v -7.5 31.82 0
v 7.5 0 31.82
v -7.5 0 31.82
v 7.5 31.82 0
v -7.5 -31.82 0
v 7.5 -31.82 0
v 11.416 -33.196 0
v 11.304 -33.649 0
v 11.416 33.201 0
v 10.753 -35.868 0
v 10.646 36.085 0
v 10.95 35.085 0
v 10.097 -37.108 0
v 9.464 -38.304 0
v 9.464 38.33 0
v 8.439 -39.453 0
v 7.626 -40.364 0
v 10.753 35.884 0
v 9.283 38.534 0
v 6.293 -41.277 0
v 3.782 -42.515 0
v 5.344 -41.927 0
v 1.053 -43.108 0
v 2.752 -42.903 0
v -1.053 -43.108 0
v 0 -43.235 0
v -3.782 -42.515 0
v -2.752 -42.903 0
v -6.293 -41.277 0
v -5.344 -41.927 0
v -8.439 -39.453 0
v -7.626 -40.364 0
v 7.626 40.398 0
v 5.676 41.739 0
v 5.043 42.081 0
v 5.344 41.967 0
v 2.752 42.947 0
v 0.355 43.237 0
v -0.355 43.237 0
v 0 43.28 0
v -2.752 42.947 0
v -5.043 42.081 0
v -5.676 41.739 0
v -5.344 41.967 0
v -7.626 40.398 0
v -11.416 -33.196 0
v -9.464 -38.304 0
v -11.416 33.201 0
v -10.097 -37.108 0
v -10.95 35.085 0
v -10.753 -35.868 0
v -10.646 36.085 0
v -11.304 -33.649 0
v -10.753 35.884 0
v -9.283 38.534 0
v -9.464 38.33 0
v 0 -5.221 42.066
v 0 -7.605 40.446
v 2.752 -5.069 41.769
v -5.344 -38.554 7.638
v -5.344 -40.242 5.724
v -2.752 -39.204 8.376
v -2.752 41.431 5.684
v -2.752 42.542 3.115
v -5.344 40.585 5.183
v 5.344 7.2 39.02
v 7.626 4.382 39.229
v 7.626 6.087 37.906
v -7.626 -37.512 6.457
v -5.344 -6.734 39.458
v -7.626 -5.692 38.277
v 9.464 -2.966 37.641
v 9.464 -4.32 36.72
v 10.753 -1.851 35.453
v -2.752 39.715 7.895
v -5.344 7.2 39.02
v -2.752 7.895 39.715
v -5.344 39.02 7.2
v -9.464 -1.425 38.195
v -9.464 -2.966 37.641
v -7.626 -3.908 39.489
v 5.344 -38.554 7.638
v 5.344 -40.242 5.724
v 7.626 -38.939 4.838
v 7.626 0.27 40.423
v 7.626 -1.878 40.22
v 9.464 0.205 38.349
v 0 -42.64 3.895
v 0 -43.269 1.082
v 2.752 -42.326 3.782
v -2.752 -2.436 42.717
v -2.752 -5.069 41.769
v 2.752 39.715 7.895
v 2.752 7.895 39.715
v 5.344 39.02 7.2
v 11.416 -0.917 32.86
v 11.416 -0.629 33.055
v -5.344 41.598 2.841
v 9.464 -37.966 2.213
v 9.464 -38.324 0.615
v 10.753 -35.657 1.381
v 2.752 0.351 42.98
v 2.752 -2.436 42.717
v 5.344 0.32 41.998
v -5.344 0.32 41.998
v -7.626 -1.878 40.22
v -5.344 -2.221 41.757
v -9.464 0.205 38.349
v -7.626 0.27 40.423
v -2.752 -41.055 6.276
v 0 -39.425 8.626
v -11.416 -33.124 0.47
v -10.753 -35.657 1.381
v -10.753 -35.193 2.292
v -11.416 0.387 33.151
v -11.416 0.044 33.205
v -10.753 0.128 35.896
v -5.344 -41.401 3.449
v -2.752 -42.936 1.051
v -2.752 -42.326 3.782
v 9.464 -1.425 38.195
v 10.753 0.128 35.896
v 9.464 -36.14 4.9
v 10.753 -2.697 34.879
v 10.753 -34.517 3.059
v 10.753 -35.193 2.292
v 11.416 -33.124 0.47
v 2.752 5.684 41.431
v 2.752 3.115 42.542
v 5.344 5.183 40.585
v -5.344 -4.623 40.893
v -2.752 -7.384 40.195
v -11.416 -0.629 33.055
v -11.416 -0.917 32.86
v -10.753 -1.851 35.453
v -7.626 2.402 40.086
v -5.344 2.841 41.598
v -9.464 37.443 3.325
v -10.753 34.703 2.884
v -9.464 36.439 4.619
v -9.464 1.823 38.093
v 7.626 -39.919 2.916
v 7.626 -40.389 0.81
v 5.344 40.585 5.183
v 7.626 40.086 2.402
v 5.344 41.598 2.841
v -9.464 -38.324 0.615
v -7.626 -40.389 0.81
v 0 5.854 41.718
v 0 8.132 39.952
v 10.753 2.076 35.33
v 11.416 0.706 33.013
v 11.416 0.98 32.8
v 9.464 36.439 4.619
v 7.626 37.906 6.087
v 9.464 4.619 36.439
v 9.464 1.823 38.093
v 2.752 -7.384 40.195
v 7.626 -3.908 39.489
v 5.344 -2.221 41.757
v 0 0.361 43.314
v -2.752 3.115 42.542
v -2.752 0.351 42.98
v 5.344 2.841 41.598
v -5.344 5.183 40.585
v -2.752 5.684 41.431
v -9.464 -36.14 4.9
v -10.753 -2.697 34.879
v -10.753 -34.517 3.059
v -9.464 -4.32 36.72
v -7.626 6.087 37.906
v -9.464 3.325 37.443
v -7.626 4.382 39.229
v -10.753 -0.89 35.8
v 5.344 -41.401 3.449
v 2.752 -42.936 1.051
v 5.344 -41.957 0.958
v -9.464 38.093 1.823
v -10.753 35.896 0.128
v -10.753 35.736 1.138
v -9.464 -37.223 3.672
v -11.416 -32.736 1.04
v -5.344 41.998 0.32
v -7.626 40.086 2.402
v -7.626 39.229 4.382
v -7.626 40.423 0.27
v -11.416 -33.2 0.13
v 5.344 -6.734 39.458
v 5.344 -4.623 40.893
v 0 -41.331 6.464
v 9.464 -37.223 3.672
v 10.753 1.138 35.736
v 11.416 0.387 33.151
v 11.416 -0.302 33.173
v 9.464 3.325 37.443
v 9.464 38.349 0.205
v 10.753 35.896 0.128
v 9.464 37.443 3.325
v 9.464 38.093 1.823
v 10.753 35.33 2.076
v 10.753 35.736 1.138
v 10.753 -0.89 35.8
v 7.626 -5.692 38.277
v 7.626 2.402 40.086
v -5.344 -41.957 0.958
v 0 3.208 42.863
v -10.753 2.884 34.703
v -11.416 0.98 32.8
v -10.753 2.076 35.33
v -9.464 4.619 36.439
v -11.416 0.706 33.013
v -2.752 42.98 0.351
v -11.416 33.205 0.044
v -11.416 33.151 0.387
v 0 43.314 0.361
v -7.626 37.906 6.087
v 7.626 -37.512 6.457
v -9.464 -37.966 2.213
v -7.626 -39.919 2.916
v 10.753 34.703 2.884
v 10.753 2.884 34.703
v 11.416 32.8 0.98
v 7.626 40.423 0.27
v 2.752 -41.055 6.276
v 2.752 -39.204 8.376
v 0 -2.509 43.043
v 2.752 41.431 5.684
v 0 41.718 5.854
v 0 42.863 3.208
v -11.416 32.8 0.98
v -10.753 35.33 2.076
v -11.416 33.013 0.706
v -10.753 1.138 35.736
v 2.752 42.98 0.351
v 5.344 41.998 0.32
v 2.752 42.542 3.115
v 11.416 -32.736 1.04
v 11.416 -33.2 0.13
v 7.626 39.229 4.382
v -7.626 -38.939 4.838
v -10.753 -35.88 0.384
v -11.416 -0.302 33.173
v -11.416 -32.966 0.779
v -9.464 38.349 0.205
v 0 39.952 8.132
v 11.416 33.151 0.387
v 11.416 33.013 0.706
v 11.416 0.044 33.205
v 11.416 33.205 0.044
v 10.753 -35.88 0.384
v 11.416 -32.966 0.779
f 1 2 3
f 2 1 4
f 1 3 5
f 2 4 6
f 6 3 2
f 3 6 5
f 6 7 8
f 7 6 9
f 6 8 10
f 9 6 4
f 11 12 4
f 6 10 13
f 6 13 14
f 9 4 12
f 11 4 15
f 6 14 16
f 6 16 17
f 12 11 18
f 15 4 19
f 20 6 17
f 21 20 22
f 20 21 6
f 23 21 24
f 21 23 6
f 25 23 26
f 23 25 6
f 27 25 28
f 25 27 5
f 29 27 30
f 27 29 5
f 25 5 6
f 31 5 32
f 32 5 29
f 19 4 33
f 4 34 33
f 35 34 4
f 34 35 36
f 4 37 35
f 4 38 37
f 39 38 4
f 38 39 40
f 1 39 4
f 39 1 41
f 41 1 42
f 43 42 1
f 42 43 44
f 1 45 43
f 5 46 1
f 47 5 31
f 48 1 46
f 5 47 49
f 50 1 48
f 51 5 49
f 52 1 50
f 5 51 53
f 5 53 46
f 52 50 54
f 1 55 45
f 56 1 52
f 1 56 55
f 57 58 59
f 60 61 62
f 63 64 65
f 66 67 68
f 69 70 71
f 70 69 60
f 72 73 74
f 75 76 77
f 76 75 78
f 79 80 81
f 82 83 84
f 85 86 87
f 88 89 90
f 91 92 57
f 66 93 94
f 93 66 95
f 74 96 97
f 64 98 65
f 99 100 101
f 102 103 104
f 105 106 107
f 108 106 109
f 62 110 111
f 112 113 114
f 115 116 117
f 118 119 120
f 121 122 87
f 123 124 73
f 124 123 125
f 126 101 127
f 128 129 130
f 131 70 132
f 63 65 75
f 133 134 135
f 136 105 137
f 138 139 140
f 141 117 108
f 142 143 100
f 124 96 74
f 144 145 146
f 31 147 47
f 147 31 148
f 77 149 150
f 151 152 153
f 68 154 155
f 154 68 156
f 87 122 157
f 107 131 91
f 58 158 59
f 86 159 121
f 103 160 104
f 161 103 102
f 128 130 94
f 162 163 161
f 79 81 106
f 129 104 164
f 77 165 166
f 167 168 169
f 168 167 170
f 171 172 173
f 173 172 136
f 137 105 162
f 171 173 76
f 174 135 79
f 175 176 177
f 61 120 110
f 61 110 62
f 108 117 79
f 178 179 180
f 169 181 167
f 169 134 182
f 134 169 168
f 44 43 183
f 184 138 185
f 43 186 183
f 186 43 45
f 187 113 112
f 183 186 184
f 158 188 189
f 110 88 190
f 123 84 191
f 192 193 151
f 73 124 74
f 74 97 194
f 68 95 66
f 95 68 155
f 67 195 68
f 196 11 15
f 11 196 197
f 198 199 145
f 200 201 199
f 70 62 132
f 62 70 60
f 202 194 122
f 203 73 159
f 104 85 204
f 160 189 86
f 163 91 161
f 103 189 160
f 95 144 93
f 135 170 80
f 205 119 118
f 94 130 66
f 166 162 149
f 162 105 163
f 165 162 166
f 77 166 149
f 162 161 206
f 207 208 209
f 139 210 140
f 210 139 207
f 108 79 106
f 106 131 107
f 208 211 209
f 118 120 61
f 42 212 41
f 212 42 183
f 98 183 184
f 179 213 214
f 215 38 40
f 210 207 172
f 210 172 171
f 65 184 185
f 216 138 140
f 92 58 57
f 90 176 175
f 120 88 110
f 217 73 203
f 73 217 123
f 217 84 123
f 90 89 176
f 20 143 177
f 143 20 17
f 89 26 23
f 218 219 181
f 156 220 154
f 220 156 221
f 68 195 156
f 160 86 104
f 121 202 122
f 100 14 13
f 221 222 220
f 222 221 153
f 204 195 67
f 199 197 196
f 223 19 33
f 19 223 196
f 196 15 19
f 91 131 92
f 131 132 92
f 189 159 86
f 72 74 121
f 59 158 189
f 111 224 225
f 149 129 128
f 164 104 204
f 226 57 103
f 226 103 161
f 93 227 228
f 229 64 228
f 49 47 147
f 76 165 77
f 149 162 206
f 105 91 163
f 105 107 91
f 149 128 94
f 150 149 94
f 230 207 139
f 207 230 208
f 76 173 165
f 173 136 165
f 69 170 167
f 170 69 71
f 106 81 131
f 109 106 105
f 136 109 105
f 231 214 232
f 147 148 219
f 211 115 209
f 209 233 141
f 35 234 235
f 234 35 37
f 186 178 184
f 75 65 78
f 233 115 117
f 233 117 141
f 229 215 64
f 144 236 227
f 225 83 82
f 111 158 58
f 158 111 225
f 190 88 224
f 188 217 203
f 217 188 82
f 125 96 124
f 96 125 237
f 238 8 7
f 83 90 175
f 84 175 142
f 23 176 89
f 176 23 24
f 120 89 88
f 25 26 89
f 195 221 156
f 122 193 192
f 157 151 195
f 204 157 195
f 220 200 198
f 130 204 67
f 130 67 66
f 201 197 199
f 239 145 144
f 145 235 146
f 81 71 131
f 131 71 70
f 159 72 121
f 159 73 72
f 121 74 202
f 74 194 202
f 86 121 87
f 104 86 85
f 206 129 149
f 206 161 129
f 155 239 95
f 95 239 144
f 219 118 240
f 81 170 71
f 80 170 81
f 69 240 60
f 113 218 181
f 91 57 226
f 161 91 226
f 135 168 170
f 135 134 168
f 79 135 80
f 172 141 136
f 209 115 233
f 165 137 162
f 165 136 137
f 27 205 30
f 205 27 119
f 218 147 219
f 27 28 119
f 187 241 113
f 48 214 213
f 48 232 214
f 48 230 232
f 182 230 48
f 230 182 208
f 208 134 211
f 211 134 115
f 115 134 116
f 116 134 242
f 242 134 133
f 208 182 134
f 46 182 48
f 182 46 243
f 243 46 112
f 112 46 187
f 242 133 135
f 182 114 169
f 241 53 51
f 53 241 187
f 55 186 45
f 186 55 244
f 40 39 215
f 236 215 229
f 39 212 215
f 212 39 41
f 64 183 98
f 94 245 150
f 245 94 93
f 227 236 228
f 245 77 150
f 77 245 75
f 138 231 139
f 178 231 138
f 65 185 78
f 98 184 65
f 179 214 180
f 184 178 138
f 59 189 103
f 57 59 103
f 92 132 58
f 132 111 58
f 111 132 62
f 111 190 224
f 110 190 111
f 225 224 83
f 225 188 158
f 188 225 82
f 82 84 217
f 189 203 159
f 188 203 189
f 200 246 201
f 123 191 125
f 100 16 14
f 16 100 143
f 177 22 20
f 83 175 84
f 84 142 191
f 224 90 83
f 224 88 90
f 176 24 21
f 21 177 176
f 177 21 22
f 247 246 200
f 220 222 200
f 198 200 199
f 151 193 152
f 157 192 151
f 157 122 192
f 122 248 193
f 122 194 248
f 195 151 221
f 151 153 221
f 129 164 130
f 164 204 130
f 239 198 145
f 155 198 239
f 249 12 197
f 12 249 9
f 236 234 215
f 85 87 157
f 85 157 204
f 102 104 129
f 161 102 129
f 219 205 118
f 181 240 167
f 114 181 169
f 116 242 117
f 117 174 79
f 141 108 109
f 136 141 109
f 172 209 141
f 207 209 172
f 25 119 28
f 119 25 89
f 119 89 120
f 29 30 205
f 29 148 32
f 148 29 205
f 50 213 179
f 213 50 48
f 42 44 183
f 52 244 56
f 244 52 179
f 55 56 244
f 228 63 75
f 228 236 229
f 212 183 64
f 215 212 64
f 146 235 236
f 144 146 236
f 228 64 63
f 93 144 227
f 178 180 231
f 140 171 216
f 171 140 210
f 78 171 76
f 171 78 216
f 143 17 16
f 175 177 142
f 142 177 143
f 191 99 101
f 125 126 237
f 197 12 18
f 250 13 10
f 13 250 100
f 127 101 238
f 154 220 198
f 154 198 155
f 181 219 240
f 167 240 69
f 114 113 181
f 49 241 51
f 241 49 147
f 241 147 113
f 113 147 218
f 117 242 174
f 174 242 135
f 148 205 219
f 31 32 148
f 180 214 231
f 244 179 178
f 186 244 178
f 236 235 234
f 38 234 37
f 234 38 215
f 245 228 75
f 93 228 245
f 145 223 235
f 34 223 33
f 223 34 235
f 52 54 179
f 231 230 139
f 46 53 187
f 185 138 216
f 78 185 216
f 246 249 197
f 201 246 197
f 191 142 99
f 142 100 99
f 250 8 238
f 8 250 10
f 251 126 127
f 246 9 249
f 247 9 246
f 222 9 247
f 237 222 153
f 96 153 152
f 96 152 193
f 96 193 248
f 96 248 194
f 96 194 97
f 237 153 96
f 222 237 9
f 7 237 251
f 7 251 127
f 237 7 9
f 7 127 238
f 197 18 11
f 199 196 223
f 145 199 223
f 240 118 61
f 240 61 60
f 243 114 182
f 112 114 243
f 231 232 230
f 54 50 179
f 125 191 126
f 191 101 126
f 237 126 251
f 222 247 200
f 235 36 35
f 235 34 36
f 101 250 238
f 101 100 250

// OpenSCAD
// PROTECTIVE CORNER FOR TABLE
//////////////////////////////
//This part is meant to be placed on the corner of a table in order to avoid people from bumping into it and getting hurt
//Designed by David LE GALL on 13/04/2016 and published under the CC-BY-NC liscence
//////////////////////////////

///////////////////
//USER PARAMETERS//
///////////////////
Table_thickness=15;//Thickness of the table to protect
Part_edge_length=45;//Length of the part along the edge of the table
Part_thickness=4;//Thicknes of the part
Quality=25;//Quality of the model
Design_1_or_2=2;//First design "sticks" a little more to the shape of the table wereas second design is more rounded


//////////////////////////////////////////////
rotate([0,-90,0])rotate([0,0,45])difference(){
if ( Design_1_or_2 == 1)
{
    hull(){
        translate([Part_edge_length/2,Part_edge_length/2,Table_thickness/2])sphere(Part_thickness,$fn=Quality);
        translate([Part_edge_length/2,Part_edge_length/2,-Table_thickness/2])sphere(Part_thickness,$fn=Quality);
        translate([Part_edge_length/2,-Part_edge_length/2,Table_thickness/2])sphere(Part_thickness,$fn=Quality);
        translate([Part_edge_length/2,-Part_edge_length/2,-Table_thickness/2])sphere(Part_thickness,$fn=Quality);
        translate([-Part_edge_length/2,-Part_edge_length/2,Table_thickness/2])sphere(Part_thickness,$fn=Quality);
        translate([-Part_edge_length/2,-Part_edge_length/2,-Table_thickness/2])sphere(Part_thickness,$fn=Quality);
    }
}
if ( Design_1_or_2 == 2)
      hull(){
        translate([Part_edge_length/2,Part_edge_length/2,0])sphere(Part_thickness+Table_thickness/2,$fn=Quality);        
        translate([Part_edge_length/2,-Part_edge_length/2,0])sphere(Part_thickness+Table_thickness/2,$fn=Quality);        
        translate([-Part_edge_length/2,-Part_edge_length/2,0])sphere(Part_thickness+Table_thickness/2,$fn=Quality);
    }

union(){
cube([Part_edge_length,Part_edge_length,Table_thickness],true);
rotate([0,0,45])translate([0,2*(Part_edge_length+Part_thickness),0])cube([4*(Part_edge_length+Part_thickness),4*(Part_edge_length+Part_thickness),4*(Part_edge_length+Part_thickness)],true);
}
}
